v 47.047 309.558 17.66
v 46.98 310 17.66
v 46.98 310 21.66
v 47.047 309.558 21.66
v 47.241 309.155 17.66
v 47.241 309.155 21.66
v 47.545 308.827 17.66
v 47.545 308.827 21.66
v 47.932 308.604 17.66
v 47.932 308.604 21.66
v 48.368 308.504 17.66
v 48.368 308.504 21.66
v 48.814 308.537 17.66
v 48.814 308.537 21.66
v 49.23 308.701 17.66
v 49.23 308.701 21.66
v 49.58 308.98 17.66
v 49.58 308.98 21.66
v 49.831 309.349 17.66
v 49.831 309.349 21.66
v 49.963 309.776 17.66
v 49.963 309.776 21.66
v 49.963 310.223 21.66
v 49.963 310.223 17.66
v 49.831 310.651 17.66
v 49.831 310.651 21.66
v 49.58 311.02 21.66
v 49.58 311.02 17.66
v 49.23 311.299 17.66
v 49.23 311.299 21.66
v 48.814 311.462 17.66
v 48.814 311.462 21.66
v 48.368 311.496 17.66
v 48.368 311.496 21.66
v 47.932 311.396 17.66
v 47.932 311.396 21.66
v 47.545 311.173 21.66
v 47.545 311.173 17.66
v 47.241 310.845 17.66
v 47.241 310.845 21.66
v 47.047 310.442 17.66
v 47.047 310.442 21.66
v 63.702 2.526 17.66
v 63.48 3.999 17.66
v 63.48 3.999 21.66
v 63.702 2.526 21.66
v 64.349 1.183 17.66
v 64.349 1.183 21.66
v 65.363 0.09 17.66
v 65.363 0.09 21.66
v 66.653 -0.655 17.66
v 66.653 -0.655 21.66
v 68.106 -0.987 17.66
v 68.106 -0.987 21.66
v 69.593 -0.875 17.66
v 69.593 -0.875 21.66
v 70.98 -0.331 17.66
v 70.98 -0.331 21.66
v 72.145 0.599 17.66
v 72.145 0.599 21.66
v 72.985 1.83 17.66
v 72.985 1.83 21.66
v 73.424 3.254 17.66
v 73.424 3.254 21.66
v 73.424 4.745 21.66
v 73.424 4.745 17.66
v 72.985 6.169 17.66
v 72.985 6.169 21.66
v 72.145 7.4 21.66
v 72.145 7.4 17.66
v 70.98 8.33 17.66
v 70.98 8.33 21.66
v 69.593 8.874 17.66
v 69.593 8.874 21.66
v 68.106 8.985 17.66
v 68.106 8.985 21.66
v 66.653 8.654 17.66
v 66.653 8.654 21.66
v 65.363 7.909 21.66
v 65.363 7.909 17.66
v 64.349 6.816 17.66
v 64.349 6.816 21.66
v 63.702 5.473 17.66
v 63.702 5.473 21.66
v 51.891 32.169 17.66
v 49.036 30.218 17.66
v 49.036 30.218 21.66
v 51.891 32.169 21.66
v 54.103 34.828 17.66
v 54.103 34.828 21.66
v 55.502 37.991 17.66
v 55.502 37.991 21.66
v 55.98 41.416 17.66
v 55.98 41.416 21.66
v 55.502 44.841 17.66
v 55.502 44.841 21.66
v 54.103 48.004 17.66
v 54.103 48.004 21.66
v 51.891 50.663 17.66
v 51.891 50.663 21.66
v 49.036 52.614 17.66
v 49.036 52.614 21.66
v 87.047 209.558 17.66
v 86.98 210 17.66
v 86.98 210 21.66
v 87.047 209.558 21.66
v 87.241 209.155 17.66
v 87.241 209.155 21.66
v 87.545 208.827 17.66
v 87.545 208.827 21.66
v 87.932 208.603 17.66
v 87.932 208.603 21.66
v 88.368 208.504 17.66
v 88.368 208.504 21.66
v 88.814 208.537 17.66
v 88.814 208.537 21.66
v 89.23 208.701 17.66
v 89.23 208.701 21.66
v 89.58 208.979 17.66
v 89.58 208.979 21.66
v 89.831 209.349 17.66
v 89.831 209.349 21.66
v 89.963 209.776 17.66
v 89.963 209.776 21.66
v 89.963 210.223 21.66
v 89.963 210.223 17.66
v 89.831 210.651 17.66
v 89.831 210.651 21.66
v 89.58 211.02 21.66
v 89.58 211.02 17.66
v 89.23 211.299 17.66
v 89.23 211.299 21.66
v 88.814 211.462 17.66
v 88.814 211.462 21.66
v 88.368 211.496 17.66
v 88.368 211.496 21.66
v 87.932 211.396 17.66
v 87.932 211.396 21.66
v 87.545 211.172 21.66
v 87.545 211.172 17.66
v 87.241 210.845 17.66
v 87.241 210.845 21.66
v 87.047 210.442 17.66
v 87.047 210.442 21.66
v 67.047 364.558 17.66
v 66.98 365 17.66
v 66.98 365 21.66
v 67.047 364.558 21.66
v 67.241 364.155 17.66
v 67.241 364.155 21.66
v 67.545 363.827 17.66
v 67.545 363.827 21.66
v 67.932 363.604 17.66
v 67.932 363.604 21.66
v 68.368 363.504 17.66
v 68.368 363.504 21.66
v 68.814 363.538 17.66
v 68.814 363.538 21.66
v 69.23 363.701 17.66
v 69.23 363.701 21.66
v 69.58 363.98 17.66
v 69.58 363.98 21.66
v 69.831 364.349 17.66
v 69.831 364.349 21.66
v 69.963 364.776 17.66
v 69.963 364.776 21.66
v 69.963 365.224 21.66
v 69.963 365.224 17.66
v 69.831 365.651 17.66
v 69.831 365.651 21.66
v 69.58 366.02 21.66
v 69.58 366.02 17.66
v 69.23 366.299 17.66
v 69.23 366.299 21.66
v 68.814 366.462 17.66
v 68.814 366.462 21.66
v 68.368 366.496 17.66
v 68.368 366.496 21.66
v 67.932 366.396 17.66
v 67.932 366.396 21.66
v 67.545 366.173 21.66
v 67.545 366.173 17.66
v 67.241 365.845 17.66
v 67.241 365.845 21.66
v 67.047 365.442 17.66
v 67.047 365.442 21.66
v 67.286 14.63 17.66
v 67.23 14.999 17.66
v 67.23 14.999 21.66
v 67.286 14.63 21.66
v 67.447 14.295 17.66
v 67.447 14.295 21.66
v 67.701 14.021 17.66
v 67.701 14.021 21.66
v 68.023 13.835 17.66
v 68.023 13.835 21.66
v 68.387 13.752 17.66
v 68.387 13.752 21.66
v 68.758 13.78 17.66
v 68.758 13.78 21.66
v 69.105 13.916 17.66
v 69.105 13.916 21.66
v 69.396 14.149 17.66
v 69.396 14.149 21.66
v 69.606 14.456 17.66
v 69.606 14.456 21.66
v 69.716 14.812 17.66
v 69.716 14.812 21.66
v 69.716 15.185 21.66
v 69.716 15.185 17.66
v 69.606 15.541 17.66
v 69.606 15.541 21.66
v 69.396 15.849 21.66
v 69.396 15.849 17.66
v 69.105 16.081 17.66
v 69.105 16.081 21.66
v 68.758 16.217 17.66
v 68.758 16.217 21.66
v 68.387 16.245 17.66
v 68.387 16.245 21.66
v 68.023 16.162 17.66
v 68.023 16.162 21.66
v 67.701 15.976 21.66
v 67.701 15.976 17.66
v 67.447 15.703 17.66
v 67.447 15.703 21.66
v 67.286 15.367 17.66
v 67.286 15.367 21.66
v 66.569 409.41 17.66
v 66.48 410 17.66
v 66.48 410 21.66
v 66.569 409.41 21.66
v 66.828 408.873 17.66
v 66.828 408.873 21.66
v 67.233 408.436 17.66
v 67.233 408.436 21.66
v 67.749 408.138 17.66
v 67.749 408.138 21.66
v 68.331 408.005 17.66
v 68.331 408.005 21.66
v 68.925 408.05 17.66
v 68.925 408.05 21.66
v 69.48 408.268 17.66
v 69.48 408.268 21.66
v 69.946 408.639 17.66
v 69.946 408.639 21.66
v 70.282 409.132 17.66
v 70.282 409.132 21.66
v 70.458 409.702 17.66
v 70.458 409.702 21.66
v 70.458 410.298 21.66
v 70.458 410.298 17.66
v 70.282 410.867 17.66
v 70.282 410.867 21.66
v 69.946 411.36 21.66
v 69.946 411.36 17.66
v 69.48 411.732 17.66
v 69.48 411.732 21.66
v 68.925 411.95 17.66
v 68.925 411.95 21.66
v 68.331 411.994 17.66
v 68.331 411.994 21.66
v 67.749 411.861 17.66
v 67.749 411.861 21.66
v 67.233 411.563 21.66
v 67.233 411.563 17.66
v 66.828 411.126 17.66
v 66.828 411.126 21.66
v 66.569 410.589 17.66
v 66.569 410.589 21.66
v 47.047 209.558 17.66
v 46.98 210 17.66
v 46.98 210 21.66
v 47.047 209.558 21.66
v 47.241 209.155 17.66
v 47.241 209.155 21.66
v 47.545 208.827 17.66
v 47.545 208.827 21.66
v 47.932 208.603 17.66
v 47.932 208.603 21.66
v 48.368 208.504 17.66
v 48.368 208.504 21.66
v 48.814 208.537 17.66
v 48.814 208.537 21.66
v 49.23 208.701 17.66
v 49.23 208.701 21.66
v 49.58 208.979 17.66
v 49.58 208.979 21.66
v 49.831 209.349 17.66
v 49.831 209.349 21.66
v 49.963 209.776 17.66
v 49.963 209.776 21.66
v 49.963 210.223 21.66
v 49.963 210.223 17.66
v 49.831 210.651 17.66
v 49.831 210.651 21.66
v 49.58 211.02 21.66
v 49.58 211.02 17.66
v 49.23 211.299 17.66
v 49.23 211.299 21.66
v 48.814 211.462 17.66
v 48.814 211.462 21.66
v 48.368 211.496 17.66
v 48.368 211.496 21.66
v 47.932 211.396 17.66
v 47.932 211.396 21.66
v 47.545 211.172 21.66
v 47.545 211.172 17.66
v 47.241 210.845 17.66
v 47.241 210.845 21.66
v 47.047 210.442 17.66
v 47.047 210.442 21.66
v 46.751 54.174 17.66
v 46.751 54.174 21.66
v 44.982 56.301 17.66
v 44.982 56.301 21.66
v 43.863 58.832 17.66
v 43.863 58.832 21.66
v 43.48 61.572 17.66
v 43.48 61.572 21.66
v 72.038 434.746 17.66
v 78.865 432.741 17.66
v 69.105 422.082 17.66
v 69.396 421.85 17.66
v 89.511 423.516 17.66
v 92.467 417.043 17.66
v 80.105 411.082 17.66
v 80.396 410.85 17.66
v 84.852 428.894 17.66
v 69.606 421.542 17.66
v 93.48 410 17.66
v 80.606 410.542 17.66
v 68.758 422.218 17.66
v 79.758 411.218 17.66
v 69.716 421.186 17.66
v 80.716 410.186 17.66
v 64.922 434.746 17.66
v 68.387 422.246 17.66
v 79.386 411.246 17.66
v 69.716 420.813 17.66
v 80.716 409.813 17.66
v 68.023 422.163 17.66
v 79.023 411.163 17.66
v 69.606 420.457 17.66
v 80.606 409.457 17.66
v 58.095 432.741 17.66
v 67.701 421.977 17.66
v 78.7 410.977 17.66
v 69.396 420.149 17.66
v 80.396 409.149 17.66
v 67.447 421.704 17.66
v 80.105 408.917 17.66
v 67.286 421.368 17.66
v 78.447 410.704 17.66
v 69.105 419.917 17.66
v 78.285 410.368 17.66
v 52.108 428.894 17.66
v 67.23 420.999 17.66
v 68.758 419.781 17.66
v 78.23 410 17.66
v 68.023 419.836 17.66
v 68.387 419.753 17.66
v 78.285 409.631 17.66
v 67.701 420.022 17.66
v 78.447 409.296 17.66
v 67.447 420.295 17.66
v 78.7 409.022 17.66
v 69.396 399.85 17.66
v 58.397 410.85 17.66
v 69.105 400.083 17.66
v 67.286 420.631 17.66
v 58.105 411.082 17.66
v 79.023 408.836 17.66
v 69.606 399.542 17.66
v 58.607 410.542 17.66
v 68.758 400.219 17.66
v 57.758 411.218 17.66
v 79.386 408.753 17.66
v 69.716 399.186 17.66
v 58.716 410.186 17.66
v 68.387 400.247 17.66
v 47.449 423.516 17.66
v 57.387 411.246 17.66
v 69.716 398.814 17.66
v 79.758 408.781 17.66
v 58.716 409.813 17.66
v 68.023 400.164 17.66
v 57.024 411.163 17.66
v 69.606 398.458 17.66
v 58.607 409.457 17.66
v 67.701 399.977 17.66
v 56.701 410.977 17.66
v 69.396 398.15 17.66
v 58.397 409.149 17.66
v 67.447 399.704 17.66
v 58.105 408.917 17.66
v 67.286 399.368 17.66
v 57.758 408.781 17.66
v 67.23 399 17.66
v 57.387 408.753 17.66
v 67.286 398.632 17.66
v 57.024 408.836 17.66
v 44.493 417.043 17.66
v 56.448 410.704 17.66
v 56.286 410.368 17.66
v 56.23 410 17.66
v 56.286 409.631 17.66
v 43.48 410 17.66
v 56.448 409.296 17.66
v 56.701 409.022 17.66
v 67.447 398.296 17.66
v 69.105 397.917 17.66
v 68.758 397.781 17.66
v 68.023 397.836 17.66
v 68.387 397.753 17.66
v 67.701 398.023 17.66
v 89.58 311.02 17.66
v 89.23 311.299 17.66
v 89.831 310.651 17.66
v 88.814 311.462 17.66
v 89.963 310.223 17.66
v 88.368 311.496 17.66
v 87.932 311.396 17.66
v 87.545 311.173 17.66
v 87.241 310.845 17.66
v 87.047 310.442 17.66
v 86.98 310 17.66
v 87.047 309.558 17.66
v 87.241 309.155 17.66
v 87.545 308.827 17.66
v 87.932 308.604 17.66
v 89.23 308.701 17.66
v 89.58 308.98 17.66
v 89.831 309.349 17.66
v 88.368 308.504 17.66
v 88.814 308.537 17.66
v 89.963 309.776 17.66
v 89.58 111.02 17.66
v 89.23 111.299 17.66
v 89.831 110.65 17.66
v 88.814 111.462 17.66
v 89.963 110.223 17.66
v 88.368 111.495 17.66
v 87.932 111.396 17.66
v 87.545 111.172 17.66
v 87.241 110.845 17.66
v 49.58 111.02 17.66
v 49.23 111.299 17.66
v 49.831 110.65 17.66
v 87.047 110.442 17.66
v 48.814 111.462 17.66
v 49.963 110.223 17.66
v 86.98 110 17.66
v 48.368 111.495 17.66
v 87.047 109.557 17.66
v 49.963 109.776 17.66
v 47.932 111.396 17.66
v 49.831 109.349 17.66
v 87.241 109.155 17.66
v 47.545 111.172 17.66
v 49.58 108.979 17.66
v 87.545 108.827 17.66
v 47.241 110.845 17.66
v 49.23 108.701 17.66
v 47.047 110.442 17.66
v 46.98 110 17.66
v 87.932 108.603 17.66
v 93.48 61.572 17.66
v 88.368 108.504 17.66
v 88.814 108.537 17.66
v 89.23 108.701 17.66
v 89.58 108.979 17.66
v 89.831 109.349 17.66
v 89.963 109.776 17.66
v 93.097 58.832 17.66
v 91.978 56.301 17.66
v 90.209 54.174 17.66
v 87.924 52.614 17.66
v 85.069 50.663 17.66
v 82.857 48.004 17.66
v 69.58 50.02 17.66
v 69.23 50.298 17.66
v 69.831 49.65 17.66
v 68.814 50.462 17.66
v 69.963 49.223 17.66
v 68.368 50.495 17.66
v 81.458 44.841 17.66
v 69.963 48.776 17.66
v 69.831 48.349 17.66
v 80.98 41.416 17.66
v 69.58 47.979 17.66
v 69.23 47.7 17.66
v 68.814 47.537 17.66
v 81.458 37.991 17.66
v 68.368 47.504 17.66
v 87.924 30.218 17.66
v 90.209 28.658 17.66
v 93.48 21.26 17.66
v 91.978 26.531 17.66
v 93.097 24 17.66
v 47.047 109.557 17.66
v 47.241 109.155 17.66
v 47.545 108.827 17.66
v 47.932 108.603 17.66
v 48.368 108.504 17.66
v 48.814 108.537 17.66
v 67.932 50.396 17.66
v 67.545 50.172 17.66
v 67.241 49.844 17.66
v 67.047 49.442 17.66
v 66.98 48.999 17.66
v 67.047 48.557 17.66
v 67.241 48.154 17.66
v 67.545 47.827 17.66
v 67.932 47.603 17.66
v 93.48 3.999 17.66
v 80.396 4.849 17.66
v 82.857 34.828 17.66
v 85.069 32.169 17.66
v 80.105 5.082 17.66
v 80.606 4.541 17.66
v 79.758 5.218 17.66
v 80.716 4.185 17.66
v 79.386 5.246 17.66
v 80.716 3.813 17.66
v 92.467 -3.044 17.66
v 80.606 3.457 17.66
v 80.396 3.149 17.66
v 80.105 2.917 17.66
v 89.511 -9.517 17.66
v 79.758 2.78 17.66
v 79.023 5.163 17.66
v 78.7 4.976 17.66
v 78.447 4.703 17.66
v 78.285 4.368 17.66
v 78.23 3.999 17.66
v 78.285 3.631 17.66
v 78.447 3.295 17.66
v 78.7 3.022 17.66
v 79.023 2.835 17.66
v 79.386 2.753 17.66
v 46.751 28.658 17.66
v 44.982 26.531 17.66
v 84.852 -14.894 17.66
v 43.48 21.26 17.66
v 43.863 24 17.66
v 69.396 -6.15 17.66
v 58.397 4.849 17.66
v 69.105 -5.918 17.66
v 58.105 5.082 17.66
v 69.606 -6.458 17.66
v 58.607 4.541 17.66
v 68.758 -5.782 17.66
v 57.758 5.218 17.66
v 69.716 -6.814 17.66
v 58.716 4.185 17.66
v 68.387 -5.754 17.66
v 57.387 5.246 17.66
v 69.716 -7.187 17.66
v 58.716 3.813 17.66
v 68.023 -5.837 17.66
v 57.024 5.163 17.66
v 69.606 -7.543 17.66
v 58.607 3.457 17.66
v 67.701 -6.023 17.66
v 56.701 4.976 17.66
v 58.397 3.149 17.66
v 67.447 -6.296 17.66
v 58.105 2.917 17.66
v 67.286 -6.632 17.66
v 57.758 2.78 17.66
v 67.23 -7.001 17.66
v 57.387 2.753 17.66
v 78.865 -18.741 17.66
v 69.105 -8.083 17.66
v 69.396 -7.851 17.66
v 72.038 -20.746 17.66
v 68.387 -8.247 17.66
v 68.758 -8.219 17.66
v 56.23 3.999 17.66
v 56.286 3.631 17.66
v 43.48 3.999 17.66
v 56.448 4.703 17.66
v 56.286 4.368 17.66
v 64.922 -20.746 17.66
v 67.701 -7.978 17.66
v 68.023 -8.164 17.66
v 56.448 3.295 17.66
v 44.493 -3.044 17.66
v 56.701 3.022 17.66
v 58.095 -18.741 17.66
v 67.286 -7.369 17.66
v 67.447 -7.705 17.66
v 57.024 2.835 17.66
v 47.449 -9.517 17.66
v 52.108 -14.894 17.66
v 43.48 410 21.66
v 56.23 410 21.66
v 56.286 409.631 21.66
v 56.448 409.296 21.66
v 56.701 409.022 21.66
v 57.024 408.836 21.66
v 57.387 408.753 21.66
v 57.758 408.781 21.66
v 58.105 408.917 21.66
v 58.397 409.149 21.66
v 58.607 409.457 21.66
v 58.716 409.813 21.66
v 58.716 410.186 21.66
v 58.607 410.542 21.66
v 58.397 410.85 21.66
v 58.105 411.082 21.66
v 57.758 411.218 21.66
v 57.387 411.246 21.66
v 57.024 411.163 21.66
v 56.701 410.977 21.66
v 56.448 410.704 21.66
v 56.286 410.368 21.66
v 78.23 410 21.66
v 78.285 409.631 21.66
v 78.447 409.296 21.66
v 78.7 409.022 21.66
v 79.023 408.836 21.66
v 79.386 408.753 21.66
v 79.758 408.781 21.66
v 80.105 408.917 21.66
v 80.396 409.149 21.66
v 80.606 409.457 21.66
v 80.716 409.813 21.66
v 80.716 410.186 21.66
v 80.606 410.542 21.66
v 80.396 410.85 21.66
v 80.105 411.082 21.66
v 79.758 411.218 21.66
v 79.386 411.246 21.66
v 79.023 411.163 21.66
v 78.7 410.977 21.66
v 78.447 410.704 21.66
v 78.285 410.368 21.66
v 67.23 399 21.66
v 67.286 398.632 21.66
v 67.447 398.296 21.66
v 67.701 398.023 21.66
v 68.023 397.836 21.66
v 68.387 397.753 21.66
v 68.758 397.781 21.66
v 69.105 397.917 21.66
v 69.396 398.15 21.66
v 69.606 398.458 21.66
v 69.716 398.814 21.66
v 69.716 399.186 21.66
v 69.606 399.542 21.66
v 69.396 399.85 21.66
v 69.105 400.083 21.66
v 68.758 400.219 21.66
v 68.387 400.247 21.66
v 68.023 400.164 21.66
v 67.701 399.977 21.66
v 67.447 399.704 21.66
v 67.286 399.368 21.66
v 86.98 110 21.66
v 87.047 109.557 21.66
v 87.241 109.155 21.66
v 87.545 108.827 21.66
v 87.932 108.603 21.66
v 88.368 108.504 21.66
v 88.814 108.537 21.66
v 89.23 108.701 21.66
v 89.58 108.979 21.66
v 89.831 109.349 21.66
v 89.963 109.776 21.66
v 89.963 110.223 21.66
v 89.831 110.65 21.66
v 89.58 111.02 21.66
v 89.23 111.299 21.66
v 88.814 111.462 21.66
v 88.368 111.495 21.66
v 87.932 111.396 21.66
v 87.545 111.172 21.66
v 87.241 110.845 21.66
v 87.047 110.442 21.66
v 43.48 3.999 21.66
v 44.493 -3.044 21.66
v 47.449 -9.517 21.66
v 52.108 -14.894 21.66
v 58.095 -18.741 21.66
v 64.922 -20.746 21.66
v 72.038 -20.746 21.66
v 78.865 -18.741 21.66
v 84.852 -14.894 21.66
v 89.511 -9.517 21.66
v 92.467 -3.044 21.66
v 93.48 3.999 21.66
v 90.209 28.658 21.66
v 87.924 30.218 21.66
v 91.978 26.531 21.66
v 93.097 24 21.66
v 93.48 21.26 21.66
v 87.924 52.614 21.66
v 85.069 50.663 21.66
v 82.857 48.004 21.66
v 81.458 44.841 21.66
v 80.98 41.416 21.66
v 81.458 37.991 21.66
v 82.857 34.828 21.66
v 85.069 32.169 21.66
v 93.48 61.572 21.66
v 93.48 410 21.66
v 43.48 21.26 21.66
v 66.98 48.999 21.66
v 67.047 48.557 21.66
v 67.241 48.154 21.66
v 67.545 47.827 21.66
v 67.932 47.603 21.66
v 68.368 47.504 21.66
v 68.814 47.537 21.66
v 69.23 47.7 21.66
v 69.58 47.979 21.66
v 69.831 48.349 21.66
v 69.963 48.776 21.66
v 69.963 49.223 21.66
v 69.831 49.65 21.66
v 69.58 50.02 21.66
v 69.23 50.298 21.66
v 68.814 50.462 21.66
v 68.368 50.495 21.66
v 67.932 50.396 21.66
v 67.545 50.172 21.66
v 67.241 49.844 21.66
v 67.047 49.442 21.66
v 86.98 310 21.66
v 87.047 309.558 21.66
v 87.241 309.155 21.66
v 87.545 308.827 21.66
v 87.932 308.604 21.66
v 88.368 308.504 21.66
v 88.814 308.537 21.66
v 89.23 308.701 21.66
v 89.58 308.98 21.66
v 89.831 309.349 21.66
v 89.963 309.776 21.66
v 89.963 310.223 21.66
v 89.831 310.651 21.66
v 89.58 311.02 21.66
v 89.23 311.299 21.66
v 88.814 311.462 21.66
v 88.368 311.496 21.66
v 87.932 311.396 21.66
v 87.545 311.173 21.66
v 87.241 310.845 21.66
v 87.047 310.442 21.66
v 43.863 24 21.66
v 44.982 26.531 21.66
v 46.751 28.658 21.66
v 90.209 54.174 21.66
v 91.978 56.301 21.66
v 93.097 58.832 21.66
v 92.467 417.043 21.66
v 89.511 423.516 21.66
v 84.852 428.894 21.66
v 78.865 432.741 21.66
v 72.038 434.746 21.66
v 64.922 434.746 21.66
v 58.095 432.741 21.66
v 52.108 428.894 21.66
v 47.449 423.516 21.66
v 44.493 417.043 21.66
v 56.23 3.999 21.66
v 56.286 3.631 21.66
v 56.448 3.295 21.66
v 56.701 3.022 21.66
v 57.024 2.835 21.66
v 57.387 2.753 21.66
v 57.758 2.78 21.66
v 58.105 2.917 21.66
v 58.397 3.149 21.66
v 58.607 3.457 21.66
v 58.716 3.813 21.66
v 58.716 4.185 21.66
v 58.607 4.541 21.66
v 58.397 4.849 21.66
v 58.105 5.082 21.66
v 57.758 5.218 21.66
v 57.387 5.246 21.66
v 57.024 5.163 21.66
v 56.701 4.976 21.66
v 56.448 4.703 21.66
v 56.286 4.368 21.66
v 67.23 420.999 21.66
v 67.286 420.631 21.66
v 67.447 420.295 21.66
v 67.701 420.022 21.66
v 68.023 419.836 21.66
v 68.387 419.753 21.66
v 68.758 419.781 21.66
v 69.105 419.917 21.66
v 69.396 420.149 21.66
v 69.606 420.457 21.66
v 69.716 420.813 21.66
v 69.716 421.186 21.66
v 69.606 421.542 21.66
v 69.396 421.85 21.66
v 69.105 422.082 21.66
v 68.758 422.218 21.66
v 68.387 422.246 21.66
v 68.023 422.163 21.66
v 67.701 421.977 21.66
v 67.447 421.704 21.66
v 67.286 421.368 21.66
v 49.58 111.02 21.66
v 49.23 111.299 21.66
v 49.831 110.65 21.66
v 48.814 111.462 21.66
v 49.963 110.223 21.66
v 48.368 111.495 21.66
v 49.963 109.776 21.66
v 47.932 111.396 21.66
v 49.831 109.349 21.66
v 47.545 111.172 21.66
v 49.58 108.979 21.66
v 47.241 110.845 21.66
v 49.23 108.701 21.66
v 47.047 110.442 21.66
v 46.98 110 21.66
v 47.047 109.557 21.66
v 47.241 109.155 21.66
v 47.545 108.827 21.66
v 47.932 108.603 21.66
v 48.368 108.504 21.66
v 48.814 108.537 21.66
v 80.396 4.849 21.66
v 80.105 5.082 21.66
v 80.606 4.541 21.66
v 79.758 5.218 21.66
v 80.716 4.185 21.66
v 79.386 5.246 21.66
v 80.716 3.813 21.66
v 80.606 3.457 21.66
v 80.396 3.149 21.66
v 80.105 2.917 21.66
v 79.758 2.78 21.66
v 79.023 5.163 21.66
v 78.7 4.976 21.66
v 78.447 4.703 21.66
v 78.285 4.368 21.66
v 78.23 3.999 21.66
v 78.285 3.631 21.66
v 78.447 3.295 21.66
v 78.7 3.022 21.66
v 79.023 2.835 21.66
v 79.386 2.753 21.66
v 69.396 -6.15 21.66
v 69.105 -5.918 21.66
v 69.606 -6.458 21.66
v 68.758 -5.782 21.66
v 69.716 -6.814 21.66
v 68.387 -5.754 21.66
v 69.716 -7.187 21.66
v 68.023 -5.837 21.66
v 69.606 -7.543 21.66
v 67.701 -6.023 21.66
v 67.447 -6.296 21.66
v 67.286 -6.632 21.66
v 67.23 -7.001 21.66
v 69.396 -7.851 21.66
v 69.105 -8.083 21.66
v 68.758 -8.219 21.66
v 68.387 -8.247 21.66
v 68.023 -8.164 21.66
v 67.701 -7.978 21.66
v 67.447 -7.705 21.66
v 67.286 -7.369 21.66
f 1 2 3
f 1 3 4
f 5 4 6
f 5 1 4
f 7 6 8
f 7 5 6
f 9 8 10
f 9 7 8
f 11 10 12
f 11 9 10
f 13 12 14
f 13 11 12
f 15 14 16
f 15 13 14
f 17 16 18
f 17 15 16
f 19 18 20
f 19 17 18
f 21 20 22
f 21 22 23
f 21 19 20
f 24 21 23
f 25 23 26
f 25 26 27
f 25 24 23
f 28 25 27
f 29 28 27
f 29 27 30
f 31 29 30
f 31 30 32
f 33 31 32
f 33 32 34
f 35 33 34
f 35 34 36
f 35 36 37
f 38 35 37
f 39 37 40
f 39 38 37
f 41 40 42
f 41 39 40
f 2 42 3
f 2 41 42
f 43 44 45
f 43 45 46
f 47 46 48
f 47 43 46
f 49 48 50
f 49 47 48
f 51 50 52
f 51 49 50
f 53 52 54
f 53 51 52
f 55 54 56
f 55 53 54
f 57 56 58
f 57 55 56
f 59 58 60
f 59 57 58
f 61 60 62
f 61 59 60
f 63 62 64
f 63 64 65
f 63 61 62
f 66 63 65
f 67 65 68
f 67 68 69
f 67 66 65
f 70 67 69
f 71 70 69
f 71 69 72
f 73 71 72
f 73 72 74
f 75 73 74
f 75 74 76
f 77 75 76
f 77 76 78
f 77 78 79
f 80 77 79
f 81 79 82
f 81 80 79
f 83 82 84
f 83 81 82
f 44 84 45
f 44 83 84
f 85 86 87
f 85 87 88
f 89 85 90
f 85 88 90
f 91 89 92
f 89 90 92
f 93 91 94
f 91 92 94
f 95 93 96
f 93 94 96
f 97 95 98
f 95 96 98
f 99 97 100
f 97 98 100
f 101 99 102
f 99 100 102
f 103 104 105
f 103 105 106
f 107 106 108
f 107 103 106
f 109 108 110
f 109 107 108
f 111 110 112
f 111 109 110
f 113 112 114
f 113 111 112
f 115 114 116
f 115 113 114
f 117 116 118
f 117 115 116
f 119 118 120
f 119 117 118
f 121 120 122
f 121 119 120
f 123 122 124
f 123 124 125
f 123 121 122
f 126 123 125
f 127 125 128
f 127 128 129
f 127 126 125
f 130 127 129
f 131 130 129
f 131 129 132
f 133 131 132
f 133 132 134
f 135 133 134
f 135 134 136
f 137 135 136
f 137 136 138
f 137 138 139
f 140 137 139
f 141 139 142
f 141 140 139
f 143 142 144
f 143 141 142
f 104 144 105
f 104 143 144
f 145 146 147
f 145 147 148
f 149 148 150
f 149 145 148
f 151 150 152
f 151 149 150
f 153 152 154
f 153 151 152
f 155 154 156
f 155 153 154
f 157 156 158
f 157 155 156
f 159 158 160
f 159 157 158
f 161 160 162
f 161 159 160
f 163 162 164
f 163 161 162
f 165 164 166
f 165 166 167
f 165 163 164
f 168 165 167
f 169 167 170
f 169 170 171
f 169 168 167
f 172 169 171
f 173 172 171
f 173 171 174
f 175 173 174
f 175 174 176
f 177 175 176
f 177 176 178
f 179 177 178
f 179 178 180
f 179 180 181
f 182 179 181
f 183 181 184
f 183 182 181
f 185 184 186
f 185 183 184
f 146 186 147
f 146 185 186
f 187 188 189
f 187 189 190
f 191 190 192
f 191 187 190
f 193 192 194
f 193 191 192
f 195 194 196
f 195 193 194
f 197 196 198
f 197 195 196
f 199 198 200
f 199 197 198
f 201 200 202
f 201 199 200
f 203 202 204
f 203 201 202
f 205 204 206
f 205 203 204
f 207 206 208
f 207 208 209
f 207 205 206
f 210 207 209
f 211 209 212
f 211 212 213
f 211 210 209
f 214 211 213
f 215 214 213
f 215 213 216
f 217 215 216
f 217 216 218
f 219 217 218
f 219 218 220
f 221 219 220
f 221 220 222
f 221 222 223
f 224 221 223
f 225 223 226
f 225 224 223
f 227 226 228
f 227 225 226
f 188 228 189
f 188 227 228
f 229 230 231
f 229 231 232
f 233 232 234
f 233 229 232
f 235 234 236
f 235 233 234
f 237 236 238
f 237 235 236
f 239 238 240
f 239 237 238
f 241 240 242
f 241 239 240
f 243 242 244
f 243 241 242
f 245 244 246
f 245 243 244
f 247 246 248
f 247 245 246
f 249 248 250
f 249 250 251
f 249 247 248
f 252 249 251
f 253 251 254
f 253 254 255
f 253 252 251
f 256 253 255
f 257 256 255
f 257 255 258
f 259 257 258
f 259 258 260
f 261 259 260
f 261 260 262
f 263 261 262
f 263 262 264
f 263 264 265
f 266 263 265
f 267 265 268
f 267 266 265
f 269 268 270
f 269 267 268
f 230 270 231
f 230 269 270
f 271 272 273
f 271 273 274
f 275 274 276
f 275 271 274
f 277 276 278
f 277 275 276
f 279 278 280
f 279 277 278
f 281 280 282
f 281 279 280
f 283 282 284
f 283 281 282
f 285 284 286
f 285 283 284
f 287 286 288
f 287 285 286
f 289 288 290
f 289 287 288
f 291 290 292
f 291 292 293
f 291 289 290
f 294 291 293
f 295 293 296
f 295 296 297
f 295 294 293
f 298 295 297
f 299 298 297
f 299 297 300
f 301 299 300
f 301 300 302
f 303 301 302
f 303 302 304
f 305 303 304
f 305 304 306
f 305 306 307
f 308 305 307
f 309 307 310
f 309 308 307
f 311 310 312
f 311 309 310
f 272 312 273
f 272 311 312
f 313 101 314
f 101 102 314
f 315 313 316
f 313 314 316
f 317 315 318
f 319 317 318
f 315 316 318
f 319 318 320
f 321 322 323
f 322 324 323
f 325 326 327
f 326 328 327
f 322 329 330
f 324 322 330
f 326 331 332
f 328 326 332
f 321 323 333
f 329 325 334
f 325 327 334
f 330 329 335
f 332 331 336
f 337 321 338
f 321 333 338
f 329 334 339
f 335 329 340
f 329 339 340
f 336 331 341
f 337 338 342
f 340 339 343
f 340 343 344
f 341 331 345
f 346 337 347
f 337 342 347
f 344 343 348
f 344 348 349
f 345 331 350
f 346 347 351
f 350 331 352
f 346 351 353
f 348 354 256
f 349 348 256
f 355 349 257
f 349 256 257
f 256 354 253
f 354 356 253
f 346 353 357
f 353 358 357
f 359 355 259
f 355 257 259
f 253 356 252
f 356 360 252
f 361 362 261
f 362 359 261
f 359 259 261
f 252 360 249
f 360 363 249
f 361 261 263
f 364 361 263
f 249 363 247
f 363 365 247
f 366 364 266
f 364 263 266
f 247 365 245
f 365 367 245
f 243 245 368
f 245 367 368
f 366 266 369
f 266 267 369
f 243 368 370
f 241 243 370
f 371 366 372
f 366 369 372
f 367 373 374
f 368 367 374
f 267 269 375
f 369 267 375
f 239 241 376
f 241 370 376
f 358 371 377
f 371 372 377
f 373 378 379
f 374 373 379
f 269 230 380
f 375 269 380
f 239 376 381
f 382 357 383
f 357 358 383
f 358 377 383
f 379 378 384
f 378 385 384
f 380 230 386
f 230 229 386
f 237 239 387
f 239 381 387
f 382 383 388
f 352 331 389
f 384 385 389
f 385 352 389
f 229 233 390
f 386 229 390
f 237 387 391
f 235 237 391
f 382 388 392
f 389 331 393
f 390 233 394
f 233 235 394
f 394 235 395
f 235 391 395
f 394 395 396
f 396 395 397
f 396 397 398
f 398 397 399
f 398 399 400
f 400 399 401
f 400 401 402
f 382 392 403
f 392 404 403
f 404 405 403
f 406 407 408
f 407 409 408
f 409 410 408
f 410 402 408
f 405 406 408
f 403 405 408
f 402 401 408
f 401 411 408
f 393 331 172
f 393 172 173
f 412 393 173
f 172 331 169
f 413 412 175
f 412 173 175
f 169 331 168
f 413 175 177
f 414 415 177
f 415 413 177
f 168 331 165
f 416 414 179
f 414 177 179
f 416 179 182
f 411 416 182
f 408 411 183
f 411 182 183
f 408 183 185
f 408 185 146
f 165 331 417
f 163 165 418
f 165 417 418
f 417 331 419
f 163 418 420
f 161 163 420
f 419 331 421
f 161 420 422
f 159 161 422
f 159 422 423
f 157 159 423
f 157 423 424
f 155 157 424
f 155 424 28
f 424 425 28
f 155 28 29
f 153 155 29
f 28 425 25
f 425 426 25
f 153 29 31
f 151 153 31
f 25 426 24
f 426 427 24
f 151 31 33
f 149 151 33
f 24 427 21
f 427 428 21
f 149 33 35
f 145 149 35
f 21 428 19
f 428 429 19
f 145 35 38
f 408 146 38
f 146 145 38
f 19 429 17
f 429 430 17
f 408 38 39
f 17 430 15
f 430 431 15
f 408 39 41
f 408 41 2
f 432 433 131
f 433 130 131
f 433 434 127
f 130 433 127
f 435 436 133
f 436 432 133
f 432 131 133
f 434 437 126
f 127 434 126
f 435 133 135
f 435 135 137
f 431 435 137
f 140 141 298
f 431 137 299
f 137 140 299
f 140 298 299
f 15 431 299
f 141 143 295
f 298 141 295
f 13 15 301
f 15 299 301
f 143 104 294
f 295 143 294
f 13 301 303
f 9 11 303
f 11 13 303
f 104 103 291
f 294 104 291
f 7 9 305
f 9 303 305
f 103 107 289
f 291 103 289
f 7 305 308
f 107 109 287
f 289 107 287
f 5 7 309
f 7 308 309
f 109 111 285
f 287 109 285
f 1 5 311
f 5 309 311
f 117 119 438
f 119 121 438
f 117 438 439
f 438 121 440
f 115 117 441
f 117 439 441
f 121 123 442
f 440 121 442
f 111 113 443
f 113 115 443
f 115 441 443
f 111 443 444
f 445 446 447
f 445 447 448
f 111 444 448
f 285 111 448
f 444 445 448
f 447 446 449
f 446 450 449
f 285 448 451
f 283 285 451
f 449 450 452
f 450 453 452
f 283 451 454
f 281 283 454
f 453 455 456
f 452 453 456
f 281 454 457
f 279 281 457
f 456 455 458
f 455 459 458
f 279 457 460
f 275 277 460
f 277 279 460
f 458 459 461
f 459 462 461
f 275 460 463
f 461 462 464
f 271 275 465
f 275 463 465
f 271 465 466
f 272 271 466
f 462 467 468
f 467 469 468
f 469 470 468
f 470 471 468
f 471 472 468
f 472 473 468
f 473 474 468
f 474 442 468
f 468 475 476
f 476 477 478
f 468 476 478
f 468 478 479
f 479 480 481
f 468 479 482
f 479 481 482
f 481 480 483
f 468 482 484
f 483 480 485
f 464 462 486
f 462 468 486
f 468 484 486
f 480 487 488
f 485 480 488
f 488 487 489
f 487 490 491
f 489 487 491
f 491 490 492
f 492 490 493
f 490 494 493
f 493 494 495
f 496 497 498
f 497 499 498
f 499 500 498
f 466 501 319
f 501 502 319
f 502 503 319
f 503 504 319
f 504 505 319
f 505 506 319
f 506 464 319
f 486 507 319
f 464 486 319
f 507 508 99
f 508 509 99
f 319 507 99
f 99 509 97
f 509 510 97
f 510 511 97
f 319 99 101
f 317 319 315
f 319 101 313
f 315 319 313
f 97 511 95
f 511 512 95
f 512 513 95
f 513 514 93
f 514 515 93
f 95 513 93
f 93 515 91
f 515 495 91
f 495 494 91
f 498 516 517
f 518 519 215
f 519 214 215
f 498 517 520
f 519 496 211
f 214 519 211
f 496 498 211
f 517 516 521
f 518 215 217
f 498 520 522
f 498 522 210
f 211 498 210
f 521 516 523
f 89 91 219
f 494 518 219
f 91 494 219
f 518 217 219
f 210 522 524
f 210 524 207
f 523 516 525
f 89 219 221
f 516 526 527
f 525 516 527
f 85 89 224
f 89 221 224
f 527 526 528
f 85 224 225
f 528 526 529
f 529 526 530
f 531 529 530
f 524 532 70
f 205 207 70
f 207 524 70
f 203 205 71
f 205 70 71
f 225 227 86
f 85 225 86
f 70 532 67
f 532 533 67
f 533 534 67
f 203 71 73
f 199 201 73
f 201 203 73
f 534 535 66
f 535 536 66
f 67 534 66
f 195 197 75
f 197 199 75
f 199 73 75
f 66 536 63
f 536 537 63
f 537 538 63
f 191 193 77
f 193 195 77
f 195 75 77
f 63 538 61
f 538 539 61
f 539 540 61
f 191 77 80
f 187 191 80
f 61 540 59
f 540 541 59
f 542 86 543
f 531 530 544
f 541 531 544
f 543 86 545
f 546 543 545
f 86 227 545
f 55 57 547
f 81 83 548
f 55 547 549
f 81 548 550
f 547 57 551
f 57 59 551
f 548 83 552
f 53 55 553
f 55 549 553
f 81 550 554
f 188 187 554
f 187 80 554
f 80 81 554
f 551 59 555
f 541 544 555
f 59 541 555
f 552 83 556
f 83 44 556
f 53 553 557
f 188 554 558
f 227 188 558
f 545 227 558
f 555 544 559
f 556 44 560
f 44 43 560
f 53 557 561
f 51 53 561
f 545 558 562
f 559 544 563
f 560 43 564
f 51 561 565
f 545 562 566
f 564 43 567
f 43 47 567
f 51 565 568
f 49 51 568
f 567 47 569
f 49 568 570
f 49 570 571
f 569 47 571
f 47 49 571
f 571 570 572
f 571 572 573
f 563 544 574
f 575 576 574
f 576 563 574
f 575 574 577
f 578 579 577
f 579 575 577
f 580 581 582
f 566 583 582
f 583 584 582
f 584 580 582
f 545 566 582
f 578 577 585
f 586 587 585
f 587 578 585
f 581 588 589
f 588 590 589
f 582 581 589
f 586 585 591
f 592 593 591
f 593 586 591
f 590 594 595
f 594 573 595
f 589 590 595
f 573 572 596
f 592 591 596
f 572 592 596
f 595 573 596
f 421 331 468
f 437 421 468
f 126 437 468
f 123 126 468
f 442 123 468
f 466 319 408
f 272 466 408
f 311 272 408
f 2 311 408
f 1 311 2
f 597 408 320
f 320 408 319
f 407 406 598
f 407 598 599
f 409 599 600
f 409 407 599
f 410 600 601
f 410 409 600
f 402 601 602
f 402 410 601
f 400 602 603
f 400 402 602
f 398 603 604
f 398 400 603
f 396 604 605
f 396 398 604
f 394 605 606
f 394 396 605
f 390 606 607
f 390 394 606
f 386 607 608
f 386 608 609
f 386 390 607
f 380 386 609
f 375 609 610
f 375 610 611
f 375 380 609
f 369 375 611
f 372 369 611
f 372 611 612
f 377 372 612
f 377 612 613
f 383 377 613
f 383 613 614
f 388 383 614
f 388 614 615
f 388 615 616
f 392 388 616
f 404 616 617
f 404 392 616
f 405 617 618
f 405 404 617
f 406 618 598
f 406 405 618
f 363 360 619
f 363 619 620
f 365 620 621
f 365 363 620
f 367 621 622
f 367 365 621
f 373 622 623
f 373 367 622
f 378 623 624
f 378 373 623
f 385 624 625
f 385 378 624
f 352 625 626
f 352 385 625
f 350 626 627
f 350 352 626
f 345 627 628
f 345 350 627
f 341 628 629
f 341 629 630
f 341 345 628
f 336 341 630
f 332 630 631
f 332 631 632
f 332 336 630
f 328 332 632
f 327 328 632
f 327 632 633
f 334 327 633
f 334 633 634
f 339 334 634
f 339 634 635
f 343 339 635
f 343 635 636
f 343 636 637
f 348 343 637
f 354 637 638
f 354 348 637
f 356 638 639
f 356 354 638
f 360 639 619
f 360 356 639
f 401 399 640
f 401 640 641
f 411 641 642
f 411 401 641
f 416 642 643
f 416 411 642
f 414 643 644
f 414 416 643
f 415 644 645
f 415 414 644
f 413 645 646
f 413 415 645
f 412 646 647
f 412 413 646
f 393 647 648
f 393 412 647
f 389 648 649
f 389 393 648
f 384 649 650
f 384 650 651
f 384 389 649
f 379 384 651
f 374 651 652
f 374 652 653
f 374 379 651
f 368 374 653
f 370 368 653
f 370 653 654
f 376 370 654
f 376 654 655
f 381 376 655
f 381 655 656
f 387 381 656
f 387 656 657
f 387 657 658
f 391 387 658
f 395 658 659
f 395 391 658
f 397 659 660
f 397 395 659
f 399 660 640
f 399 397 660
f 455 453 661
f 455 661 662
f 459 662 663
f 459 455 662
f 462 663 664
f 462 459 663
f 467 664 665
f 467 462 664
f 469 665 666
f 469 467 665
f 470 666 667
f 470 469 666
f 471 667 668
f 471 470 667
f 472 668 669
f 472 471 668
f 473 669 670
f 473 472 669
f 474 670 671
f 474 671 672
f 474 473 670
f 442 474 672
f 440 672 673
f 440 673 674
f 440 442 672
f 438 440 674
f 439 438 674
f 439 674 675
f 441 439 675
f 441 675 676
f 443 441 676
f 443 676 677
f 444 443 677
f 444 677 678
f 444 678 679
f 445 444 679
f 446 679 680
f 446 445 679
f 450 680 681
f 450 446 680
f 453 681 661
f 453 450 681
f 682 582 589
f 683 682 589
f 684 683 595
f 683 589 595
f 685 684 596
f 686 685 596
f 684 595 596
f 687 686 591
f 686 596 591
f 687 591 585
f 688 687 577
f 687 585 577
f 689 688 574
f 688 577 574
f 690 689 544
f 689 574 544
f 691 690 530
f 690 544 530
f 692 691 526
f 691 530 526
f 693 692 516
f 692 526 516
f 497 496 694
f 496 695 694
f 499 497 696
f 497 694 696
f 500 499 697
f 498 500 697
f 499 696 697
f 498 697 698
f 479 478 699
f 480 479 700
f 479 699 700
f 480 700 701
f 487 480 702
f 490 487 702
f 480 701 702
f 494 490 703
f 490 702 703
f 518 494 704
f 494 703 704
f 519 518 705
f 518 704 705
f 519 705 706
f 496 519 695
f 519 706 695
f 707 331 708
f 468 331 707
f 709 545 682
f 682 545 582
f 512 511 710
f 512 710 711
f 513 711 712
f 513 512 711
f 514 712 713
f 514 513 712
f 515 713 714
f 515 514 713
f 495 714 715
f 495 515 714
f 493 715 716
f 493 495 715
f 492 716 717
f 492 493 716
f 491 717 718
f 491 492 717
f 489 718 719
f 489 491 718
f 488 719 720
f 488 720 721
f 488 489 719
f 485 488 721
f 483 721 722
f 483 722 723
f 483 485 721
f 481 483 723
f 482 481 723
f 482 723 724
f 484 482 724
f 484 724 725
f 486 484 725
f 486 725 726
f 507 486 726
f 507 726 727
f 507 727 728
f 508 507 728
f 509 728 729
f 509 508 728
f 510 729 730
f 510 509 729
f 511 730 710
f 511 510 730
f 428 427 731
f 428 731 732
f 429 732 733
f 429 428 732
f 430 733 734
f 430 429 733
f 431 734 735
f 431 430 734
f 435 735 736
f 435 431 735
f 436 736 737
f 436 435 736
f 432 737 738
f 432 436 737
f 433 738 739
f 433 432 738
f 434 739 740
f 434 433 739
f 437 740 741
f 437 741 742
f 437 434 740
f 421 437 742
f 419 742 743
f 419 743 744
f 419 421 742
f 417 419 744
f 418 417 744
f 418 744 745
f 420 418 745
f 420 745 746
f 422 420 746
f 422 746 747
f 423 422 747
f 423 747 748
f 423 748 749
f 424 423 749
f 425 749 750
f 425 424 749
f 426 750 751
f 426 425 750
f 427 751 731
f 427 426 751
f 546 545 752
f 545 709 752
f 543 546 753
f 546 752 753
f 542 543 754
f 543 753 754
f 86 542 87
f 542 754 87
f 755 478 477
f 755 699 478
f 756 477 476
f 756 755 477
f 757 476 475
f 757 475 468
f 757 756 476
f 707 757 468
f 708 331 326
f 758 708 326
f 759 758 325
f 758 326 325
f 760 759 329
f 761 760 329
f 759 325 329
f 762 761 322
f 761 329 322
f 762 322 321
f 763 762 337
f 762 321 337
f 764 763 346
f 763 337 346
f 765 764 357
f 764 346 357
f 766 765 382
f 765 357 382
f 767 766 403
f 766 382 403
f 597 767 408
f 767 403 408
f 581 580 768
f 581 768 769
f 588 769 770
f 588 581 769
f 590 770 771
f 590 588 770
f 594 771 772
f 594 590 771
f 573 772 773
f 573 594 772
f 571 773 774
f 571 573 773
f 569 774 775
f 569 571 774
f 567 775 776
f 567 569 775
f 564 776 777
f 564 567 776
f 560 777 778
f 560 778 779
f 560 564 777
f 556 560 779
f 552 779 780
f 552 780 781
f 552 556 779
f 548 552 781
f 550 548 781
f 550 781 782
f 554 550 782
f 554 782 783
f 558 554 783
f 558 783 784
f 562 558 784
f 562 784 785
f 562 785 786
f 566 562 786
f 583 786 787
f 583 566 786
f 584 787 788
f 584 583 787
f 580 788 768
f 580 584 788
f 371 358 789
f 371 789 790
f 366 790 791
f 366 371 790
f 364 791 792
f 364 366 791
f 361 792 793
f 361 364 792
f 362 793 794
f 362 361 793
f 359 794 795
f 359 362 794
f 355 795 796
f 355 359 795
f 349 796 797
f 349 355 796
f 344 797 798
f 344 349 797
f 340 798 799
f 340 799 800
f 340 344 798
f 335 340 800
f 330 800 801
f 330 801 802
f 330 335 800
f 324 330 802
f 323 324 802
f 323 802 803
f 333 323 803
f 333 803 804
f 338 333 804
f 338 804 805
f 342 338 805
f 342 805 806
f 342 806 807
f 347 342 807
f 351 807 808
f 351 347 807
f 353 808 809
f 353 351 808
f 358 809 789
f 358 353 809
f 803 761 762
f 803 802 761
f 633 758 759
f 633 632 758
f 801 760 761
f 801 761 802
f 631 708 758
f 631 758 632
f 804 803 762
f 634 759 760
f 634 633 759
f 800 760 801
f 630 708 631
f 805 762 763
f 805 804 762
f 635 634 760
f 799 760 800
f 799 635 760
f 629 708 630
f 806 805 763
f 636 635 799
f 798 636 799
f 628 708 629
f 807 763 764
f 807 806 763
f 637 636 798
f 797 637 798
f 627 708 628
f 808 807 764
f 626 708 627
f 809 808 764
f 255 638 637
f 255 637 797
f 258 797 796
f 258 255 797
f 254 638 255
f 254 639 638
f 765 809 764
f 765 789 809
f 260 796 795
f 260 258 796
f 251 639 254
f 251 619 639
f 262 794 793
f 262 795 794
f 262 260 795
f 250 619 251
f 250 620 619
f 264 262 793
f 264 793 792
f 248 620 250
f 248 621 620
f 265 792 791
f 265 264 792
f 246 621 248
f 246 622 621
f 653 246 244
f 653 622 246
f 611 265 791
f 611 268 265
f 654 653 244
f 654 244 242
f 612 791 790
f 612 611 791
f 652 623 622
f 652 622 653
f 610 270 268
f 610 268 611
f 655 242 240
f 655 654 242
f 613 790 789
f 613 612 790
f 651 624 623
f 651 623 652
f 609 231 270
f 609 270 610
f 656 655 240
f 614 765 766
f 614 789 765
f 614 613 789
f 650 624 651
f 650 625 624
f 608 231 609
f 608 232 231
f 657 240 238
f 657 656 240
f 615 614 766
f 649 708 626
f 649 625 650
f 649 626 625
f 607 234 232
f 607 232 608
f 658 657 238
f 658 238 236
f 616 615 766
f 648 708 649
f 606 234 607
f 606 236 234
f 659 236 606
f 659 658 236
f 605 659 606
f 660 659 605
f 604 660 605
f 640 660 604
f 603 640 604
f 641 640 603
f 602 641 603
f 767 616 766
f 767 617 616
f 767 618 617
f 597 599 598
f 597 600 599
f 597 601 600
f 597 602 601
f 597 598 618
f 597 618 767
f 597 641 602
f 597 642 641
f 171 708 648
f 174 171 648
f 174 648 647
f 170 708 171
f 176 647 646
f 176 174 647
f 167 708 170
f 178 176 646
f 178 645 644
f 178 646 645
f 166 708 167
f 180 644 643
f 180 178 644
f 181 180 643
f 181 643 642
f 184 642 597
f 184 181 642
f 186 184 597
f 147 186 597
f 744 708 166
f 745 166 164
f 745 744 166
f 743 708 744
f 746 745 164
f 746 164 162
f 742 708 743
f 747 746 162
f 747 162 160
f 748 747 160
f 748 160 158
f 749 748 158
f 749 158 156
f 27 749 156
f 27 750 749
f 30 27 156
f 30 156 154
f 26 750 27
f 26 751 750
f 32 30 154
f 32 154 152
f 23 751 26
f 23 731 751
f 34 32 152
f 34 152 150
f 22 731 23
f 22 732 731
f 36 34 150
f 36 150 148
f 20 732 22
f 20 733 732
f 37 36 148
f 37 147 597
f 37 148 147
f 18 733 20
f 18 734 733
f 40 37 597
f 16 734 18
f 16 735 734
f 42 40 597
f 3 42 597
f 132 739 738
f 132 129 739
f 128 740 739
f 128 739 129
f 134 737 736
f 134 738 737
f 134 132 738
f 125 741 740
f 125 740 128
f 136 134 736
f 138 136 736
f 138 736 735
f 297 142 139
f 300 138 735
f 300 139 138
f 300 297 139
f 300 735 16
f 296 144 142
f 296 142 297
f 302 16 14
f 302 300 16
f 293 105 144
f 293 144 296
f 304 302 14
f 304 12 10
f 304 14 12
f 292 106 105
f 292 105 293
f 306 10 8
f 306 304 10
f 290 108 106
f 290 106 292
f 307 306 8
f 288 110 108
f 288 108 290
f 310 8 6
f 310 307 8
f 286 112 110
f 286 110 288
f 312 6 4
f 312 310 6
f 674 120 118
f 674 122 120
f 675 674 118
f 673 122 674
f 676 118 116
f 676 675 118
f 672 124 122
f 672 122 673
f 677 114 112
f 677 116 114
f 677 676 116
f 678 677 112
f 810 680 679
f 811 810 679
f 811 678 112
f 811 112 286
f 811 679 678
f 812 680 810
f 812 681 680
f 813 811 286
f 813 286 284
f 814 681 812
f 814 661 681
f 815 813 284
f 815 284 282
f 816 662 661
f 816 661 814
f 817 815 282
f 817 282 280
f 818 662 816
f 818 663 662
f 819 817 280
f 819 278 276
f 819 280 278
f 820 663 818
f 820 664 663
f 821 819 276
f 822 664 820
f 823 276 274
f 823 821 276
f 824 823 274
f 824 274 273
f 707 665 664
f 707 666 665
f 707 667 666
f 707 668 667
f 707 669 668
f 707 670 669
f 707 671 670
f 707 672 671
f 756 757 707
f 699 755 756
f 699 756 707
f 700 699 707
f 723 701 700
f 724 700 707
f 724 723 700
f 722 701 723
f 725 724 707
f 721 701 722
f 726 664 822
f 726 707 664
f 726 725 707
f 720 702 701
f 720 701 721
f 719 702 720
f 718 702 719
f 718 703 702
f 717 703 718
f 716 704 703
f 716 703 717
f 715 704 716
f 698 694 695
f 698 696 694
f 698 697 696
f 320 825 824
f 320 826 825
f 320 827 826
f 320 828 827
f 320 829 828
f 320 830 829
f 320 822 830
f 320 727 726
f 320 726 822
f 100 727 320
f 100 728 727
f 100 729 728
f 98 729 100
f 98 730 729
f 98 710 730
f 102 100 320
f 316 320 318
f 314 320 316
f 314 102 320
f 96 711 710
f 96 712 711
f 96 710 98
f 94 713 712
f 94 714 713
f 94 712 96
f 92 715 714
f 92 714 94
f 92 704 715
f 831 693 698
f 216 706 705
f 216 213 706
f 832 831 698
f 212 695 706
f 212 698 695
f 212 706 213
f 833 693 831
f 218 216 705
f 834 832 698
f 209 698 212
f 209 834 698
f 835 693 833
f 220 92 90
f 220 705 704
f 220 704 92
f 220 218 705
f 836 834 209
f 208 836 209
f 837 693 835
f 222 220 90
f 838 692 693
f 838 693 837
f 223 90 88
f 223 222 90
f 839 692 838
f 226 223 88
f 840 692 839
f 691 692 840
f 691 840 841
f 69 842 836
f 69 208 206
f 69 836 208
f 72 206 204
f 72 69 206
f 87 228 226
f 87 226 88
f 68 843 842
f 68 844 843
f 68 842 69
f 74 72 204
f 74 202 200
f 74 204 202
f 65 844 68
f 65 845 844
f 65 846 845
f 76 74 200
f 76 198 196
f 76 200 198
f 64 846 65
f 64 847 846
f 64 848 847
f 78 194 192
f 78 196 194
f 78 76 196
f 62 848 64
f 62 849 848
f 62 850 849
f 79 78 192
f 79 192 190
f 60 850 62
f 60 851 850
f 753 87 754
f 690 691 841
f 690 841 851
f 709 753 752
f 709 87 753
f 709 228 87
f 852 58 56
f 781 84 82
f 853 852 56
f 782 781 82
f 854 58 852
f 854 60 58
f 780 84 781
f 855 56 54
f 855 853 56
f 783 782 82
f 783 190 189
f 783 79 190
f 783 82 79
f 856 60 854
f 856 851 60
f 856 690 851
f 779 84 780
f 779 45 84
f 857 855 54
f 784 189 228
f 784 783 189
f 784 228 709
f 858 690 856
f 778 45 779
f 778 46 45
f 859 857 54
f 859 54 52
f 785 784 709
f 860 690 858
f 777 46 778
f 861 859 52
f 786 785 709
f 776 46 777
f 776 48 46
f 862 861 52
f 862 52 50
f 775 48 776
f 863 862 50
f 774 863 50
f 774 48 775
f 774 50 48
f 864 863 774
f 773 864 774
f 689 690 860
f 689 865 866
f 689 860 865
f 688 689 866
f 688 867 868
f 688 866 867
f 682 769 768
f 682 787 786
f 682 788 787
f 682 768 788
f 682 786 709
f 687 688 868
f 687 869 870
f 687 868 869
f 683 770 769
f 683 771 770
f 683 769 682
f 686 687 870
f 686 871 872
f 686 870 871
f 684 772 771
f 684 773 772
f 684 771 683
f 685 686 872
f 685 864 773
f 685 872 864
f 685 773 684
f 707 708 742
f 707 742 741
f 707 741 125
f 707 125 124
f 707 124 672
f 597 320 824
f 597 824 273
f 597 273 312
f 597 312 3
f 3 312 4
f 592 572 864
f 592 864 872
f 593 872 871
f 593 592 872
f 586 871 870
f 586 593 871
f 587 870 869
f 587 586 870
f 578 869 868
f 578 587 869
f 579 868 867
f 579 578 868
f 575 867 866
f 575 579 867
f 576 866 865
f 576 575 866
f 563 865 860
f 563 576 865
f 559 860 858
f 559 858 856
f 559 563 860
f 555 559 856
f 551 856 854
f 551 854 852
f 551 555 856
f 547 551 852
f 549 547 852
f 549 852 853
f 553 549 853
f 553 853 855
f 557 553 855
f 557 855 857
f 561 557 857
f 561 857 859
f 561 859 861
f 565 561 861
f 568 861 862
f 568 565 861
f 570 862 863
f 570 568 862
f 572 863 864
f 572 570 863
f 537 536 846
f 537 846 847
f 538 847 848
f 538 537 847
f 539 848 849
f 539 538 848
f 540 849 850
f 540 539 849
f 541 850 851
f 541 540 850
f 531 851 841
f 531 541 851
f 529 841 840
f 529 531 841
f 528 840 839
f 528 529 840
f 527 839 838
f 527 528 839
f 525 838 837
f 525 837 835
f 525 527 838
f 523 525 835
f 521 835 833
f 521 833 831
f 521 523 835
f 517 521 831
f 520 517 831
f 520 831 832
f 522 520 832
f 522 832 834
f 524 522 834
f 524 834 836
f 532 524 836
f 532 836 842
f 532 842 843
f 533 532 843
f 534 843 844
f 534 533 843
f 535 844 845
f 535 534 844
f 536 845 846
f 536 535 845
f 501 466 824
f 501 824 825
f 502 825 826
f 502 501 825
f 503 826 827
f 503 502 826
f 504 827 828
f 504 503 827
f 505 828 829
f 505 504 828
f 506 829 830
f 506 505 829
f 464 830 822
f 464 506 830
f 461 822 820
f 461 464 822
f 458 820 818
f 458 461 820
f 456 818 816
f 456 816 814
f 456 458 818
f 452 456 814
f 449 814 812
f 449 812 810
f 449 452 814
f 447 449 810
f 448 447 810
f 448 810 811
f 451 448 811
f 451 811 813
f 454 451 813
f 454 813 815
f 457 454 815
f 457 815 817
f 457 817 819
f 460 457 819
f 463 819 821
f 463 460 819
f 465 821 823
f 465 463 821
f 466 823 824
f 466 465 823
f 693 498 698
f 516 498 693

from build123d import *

# Parameters (mm, degrees)
SKETCH001_R             = 2
SKETCH001_R_2           = 1.25
SKETCH001_R_3           = 1.5
SKETCH001_R_4           = 5
PAD001_DEPTH            = 4
SKETCH002_R             = 12.5
POCKET_DEPTH            = 11
FILLET_R                = 10
BODY001_PLACEMENT_ANGLE = 180


with BuildPart() as part:
    # Sketch001 → Pad001 (new body)
    with BuildSketch(Plane.XY):
        with BuildLine():
            ThreePointArc((-25, 0), (0, -25), (25, 0))
            Line((25, 0), (25, 406.000606))
            ThreePointArc((25, 406.000606), (0, 431.000606), (-25, 406.000606))
            Line((-25, 0), (-25, 406.000606))
        make_face()
        with Locations((0, 0.000303)):
            Circle(SKETCH001_R, mode=Mode.SUBTRACT)
        with Locations((10.999698, 0.000303)):
            Circle(SKETCH001_R_2, mode=Mode.SUBTRACT)
        with Locations((0, 11)):
            Circle(SKETCH001_R_2, mode=Mode.SUBTRACT)
        with Locations((-10.999697, 0.000303)):
            Circle(SKETCH001_R_2, mode=Mode.SUBTRACT)
        with Locations((0, -10.999395)):
            Circle(SKETCH001_R_2, mode=Mode.SUBTRACT)
        with Locations((-20, 300.000454)):
            Circle(SKETCH001_R_3, mode=Mode.SUBTRACT)
        with Locations((20, 300.000454)):
            Circle(SKETCH001_R_3, mode=Mode.SUBTRACT)
        with Locations((-20, 200.000303)):
            Circle(SKETCH001_R_3, mode=Mode.SUBTRACT)
        with Locations((20, 200.000303)):
            Circle(SKETCH001_R_3, mode=Mode.SUBTRACT)
        with Locations((-20, 100.000152)):
            Circle(SKETCH001_R_3, mode=Mode.SUBTRACT)
        with Locations((20, 100.000152)):
            Circle(SKETCH001_R_3, mode=Mode.SUBTRACT)
        with Locations((0, 45)):
            Circle(SKETCH001_R_3, mode=Mode.SUBTRACT)
        with Locations((0, 406.000606)):
            Circle(SKETCH001_R_4, mode=Mode.SUBTRACT)
        with Locations((0, 417.000606)):
            Circle(SKETCH001_R_2, mode=Mode.SUBTRACT)
        with Locations((-10.999697, 406.000909)):
            Circle(SKETCH001_R_2, mode=Mode.SUBTRACT)
        with Locations((0, 395.001211)):
            Circle(SKETCH001_R_2, mode=Mode.SUBTRACT)
        with Locations((10.999698, 406.000909)):
            Circle(SKETCH001_R_2, mode=Mode.SUBTRACT)
        with Locations((0, 361.000606)):
            Circle(SKETCH001_R_3, mode=Mode.SUBTRACT)
    extrude(amount=PAD001_DEPTH)

    # Sketch002 (on Face24 of Pad001) → Pocket (cut)
    with BuildSketch(Plane.XY.offset(4)):
        with Locations((-25, 368.584032)):
            Circle(SKETCH002_R)
        with Locations((25, 368.584032)):
            Circle(SKETCH002_R)
    extrude(amount=-POCKET_DEPTH, mode=Mode.SUBTRACT)

    # Fillet
    fillet_edges = [part.edges().sort_by_distance(p)[0] for p in [
        (25, 381.084032, 2),
        (25, 356.084032, 2),
        (-25, 381.084032, 2),
        (-25, 356.084032, 2),
    ]]
    fillet(fillet_edges, radius=FILLET_R)


with BuildPart() as part_1:
    # Body001 placement: moved
    add(part.part.moved(Location((68.48, 410, 17.66))).rotate(Axis((68.48, 410, 17.66), (0, 0, 1)), BODY001_PLACEMENT_ANGLE))


solid = part_1.part
